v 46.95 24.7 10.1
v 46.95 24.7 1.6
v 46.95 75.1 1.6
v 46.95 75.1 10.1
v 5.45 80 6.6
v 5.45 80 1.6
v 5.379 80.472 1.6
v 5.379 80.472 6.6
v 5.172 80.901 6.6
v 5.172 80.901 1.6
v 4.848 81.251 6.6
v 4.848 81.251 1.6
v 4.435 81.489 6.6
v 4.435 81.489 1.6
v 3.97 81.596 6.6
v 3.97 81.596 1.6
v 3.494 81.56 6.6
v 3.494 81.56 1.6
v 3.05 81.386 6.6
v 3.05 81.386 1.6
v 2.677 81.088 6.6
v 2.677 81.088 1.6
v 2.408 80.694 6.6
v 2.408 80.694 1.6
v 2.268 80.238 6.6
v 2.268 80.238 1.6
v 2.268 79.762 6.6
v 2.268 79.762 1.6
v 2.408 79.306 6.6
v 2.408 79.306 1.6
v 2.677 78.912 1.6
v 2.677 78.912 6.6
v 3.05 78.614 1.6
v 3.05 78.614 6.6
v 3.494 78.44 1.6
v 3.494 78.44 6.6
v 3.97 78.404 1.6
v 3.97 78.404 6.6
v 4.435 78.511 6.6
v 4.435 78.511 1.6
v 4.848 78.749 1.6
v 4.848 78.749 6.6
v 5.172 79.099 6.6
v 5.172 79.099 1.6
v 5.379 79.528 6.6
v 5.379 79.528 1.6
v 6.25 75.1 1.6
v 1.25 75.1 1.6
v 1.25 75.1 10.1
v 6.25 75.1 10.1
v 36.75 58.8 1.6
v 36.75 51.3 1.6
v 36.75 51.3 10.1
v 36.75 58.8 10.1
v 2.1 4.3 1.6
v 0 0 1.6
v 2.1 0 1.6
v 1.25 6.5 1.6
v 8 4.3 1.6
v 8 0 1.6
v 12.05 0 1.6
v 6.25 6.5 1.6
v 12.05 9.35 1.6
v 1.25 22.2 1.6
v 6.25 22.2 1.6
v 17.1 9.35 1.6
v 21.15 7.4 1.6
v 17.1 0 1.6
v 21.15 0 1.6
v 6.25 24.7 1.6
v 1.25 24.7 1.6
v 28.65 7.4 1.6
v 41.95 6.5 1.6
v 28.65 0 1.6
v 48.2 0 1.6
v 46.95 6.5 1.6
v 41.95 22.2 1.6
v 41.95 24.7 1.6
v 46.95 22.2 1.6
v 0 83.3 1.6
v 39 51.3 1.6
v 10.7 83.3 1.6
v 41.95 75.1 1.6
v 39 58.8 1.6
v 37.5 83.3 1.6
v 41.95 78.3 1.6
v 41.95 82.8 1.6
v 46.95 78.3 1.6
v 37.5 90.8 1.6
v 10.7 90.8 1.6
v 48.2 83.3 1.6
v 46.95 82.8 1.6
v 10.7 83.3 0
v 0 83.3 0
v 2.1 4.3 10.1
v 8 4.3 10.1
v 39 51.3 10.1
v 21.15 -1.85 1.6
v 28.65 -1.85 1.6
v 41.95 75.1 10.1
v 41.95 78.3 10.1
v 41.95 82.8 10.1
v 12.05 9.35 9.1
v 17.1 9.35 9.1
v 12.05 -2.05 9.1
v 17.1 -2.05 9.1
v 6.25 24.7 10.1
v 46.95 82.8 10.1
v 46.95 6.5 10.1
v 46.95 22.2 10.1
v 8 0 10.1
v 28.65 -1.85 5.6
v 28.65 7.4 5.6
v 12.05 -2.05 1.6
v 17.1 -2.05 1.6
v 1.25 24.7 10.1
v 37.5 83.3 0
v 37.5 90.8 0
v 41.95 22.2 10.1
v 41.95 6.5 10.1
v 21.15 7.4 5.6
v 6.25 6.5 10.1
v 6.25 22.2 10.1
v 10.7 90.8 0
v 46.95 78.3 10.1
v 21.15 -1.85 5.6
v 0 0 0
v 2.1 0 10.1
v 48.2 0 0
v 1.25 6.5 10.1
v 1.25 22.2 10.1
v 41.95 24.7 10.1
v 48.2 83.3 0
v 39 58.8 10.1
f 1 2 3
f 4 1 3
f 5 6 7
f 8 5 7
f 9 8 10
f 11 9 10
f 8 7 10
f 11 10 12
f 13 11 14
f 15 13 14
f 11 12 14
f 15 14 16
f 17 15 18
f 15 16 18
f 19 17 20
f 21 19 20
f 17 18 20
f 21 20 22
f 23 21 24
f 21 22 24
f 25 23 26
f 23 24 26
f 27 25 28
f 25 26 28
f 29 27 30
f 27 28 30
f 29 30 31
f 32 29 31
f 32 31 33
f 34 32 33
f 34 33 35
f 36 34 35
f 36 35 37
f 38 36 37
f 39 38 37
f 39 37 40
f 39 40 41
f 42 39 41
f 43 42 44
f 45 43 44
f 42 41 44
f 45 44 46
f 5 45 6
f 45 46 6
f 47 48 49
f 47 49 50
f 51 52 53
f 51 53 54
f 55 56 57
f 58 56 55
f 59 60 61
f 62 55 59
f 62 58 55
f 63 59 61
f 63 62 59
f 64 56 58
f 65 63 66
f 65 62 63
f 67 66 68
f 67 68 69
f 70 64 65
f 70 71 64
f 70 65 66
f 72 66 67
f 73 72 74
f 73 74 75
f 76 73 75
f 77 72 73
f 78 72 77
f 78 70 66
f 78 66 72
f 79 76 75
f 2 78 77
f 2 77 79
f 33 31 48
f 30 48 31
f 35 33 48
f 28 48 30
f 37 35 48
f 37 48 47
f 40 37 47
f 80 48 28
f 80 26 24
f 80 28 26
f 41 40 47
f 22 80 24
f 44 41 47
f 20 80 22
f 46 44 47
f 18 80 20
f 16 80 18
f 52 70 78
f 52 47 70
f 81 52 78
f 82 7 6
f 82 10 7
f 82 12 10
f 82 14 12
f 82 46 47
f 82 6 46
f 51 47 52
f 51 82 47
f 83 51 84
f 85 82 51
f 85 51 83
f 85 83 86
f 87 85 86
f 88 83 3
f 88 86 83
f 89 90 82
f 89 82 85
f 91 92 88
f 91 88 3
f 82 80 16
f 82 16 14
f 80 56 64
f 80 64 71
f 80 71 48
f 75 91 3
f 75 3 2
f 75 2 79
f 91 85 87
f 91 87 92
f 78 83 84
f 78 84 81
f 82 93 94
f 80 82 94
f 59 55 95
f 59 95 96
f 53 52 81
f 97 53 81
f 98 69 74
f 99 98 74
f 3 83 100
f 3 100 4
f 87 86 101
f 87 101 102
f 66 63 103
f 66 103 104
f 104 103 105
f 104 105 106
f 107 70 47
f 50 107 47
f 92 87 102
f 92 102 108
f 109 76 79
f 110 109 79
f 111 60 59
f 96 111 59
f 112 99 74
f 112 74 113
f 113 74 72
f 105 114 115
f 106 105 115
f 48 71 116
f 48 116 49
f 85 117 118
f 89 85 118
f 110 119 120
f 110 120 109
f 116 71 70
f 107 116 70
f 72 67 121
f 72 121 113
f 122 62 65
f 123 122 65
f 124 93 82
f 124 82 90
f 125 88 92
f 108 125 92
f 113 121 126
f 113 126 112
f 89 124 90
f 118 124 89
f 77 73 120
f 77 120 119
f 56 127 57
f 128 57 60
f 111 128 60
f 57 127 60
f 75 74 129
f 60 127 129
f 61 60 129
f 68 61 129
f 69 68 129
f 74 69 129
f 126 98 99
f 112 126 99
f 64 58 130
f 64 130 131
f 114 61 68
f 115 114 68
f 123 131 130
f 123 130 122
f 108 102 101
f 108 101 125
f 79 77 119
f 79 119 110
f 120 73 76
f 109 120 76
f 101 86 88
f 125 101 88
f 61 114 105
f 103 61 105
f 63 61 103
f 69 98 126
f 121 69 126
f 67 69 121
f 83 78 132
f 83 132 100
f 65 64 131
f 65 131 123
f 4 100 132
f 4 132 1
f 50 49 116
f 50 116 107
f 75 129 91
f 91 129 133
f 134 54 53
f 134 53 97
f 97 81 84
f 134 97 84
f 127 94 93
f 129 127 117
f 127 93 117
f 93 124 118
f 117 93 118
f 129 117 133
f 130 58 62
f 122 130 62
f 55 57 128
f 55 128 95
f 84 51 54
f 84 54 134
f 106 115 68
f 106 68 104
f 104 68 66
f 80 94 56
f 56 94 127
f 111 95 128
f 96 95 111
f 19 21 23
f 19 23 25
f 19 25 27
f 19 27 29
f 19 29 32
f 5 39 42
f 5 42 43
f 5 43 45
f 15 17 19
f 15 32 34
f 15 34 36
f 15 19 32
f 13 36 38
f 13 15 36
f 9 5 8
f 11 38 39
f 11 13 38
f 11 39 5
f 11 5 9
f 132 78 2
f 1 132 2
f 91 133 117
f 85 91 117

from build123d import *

# Parameters (mm, degrees)
F0_W     = 26.8
F0_H     = 7.5
F1_DEPTH = 1.6
F2_W     = 5
F2_H     = 50.4
F2_H_2   = 4.5
F2_W_2   = 5.9
F2_H_3   = 4.3
F2_W_3   = 2.25
F2_H_4   = 7.5
F2_H_5   = 15.7
F3_DEPTH = 8.5
F4_W     = 7.5
F4_H     = 9.25
F5_DEPTH = 4
F6_W     = 5.05
F6_H     = 11.4
F7_DEPTH = 7.5
F8_R     = 1.6
F9_DEPTH = 5


with BuildPart() as f1:
    # F0 (on Top) → F1 (new body)
    with BuildSketch(Plane.XY):
        Polygon((0, 83.3), (0, 0), (48.2, 0), (48.2, 83.3), (37.5, 83.3), (10.7, 83.3), align=None)
        with Locations((24.1, 87.05)):
            Rectangle(F0_W, F0_H)
    extrude(amount=F1_DEPTH)

    # F2 (on face) → F3 (join)
    with BuildSketch(Plane.XY.offset(1.6)):
        with Locations((3.75, 49.9)):
            Rectangle(F2_W, F2_H)
        with Locations((44.45, 80.55)):
            Rectangle(F2_W, F2_H_2)
        with Locations((44.45, 49.9)):
            Rectangle(F2_W, F2_H)
        with Locations((5.05, 2.15)):
            Rectangle(F2_W_2, F2_H_3)
        with Locations((37.875, 55.05)):
            Rectangle(F2_W_3, F2_H_4)
        with Locations((3.75, 14.35)):
            Rectangle(F2_W, F2_H_5)
        with Locations((44.45, 14.35)):
            Rectangle(F2_W, F2_H_5)
    extrude(amount=F3_DEPTH)

    # F4 (on face) → F5 (join)
    with BuildSketch(Plane.XY.offset(1.6)):
        with Locations((24.9, 2.775)):
            Rectangle(F4_W, F4_H)
    extrude(amount=F5_DEPTH)

    # F6 (on face) → F7 (join)
    with BuildSketch(Plane.XY.offset(1.6)):
        with Locations((14.575, 3.65)):
            Rectangle(F6_W, F6_H)
    extrude(amount=F7_DEPTH)

    # F8 (on face) → F9 (join)
    with BuildSketch(Plane.XY.offset(1.6)):
        with Locations((3.85, 80)):
            Circle(F8_R)
    extrude(amount=F9_DEPTH)


solid = f1.part
